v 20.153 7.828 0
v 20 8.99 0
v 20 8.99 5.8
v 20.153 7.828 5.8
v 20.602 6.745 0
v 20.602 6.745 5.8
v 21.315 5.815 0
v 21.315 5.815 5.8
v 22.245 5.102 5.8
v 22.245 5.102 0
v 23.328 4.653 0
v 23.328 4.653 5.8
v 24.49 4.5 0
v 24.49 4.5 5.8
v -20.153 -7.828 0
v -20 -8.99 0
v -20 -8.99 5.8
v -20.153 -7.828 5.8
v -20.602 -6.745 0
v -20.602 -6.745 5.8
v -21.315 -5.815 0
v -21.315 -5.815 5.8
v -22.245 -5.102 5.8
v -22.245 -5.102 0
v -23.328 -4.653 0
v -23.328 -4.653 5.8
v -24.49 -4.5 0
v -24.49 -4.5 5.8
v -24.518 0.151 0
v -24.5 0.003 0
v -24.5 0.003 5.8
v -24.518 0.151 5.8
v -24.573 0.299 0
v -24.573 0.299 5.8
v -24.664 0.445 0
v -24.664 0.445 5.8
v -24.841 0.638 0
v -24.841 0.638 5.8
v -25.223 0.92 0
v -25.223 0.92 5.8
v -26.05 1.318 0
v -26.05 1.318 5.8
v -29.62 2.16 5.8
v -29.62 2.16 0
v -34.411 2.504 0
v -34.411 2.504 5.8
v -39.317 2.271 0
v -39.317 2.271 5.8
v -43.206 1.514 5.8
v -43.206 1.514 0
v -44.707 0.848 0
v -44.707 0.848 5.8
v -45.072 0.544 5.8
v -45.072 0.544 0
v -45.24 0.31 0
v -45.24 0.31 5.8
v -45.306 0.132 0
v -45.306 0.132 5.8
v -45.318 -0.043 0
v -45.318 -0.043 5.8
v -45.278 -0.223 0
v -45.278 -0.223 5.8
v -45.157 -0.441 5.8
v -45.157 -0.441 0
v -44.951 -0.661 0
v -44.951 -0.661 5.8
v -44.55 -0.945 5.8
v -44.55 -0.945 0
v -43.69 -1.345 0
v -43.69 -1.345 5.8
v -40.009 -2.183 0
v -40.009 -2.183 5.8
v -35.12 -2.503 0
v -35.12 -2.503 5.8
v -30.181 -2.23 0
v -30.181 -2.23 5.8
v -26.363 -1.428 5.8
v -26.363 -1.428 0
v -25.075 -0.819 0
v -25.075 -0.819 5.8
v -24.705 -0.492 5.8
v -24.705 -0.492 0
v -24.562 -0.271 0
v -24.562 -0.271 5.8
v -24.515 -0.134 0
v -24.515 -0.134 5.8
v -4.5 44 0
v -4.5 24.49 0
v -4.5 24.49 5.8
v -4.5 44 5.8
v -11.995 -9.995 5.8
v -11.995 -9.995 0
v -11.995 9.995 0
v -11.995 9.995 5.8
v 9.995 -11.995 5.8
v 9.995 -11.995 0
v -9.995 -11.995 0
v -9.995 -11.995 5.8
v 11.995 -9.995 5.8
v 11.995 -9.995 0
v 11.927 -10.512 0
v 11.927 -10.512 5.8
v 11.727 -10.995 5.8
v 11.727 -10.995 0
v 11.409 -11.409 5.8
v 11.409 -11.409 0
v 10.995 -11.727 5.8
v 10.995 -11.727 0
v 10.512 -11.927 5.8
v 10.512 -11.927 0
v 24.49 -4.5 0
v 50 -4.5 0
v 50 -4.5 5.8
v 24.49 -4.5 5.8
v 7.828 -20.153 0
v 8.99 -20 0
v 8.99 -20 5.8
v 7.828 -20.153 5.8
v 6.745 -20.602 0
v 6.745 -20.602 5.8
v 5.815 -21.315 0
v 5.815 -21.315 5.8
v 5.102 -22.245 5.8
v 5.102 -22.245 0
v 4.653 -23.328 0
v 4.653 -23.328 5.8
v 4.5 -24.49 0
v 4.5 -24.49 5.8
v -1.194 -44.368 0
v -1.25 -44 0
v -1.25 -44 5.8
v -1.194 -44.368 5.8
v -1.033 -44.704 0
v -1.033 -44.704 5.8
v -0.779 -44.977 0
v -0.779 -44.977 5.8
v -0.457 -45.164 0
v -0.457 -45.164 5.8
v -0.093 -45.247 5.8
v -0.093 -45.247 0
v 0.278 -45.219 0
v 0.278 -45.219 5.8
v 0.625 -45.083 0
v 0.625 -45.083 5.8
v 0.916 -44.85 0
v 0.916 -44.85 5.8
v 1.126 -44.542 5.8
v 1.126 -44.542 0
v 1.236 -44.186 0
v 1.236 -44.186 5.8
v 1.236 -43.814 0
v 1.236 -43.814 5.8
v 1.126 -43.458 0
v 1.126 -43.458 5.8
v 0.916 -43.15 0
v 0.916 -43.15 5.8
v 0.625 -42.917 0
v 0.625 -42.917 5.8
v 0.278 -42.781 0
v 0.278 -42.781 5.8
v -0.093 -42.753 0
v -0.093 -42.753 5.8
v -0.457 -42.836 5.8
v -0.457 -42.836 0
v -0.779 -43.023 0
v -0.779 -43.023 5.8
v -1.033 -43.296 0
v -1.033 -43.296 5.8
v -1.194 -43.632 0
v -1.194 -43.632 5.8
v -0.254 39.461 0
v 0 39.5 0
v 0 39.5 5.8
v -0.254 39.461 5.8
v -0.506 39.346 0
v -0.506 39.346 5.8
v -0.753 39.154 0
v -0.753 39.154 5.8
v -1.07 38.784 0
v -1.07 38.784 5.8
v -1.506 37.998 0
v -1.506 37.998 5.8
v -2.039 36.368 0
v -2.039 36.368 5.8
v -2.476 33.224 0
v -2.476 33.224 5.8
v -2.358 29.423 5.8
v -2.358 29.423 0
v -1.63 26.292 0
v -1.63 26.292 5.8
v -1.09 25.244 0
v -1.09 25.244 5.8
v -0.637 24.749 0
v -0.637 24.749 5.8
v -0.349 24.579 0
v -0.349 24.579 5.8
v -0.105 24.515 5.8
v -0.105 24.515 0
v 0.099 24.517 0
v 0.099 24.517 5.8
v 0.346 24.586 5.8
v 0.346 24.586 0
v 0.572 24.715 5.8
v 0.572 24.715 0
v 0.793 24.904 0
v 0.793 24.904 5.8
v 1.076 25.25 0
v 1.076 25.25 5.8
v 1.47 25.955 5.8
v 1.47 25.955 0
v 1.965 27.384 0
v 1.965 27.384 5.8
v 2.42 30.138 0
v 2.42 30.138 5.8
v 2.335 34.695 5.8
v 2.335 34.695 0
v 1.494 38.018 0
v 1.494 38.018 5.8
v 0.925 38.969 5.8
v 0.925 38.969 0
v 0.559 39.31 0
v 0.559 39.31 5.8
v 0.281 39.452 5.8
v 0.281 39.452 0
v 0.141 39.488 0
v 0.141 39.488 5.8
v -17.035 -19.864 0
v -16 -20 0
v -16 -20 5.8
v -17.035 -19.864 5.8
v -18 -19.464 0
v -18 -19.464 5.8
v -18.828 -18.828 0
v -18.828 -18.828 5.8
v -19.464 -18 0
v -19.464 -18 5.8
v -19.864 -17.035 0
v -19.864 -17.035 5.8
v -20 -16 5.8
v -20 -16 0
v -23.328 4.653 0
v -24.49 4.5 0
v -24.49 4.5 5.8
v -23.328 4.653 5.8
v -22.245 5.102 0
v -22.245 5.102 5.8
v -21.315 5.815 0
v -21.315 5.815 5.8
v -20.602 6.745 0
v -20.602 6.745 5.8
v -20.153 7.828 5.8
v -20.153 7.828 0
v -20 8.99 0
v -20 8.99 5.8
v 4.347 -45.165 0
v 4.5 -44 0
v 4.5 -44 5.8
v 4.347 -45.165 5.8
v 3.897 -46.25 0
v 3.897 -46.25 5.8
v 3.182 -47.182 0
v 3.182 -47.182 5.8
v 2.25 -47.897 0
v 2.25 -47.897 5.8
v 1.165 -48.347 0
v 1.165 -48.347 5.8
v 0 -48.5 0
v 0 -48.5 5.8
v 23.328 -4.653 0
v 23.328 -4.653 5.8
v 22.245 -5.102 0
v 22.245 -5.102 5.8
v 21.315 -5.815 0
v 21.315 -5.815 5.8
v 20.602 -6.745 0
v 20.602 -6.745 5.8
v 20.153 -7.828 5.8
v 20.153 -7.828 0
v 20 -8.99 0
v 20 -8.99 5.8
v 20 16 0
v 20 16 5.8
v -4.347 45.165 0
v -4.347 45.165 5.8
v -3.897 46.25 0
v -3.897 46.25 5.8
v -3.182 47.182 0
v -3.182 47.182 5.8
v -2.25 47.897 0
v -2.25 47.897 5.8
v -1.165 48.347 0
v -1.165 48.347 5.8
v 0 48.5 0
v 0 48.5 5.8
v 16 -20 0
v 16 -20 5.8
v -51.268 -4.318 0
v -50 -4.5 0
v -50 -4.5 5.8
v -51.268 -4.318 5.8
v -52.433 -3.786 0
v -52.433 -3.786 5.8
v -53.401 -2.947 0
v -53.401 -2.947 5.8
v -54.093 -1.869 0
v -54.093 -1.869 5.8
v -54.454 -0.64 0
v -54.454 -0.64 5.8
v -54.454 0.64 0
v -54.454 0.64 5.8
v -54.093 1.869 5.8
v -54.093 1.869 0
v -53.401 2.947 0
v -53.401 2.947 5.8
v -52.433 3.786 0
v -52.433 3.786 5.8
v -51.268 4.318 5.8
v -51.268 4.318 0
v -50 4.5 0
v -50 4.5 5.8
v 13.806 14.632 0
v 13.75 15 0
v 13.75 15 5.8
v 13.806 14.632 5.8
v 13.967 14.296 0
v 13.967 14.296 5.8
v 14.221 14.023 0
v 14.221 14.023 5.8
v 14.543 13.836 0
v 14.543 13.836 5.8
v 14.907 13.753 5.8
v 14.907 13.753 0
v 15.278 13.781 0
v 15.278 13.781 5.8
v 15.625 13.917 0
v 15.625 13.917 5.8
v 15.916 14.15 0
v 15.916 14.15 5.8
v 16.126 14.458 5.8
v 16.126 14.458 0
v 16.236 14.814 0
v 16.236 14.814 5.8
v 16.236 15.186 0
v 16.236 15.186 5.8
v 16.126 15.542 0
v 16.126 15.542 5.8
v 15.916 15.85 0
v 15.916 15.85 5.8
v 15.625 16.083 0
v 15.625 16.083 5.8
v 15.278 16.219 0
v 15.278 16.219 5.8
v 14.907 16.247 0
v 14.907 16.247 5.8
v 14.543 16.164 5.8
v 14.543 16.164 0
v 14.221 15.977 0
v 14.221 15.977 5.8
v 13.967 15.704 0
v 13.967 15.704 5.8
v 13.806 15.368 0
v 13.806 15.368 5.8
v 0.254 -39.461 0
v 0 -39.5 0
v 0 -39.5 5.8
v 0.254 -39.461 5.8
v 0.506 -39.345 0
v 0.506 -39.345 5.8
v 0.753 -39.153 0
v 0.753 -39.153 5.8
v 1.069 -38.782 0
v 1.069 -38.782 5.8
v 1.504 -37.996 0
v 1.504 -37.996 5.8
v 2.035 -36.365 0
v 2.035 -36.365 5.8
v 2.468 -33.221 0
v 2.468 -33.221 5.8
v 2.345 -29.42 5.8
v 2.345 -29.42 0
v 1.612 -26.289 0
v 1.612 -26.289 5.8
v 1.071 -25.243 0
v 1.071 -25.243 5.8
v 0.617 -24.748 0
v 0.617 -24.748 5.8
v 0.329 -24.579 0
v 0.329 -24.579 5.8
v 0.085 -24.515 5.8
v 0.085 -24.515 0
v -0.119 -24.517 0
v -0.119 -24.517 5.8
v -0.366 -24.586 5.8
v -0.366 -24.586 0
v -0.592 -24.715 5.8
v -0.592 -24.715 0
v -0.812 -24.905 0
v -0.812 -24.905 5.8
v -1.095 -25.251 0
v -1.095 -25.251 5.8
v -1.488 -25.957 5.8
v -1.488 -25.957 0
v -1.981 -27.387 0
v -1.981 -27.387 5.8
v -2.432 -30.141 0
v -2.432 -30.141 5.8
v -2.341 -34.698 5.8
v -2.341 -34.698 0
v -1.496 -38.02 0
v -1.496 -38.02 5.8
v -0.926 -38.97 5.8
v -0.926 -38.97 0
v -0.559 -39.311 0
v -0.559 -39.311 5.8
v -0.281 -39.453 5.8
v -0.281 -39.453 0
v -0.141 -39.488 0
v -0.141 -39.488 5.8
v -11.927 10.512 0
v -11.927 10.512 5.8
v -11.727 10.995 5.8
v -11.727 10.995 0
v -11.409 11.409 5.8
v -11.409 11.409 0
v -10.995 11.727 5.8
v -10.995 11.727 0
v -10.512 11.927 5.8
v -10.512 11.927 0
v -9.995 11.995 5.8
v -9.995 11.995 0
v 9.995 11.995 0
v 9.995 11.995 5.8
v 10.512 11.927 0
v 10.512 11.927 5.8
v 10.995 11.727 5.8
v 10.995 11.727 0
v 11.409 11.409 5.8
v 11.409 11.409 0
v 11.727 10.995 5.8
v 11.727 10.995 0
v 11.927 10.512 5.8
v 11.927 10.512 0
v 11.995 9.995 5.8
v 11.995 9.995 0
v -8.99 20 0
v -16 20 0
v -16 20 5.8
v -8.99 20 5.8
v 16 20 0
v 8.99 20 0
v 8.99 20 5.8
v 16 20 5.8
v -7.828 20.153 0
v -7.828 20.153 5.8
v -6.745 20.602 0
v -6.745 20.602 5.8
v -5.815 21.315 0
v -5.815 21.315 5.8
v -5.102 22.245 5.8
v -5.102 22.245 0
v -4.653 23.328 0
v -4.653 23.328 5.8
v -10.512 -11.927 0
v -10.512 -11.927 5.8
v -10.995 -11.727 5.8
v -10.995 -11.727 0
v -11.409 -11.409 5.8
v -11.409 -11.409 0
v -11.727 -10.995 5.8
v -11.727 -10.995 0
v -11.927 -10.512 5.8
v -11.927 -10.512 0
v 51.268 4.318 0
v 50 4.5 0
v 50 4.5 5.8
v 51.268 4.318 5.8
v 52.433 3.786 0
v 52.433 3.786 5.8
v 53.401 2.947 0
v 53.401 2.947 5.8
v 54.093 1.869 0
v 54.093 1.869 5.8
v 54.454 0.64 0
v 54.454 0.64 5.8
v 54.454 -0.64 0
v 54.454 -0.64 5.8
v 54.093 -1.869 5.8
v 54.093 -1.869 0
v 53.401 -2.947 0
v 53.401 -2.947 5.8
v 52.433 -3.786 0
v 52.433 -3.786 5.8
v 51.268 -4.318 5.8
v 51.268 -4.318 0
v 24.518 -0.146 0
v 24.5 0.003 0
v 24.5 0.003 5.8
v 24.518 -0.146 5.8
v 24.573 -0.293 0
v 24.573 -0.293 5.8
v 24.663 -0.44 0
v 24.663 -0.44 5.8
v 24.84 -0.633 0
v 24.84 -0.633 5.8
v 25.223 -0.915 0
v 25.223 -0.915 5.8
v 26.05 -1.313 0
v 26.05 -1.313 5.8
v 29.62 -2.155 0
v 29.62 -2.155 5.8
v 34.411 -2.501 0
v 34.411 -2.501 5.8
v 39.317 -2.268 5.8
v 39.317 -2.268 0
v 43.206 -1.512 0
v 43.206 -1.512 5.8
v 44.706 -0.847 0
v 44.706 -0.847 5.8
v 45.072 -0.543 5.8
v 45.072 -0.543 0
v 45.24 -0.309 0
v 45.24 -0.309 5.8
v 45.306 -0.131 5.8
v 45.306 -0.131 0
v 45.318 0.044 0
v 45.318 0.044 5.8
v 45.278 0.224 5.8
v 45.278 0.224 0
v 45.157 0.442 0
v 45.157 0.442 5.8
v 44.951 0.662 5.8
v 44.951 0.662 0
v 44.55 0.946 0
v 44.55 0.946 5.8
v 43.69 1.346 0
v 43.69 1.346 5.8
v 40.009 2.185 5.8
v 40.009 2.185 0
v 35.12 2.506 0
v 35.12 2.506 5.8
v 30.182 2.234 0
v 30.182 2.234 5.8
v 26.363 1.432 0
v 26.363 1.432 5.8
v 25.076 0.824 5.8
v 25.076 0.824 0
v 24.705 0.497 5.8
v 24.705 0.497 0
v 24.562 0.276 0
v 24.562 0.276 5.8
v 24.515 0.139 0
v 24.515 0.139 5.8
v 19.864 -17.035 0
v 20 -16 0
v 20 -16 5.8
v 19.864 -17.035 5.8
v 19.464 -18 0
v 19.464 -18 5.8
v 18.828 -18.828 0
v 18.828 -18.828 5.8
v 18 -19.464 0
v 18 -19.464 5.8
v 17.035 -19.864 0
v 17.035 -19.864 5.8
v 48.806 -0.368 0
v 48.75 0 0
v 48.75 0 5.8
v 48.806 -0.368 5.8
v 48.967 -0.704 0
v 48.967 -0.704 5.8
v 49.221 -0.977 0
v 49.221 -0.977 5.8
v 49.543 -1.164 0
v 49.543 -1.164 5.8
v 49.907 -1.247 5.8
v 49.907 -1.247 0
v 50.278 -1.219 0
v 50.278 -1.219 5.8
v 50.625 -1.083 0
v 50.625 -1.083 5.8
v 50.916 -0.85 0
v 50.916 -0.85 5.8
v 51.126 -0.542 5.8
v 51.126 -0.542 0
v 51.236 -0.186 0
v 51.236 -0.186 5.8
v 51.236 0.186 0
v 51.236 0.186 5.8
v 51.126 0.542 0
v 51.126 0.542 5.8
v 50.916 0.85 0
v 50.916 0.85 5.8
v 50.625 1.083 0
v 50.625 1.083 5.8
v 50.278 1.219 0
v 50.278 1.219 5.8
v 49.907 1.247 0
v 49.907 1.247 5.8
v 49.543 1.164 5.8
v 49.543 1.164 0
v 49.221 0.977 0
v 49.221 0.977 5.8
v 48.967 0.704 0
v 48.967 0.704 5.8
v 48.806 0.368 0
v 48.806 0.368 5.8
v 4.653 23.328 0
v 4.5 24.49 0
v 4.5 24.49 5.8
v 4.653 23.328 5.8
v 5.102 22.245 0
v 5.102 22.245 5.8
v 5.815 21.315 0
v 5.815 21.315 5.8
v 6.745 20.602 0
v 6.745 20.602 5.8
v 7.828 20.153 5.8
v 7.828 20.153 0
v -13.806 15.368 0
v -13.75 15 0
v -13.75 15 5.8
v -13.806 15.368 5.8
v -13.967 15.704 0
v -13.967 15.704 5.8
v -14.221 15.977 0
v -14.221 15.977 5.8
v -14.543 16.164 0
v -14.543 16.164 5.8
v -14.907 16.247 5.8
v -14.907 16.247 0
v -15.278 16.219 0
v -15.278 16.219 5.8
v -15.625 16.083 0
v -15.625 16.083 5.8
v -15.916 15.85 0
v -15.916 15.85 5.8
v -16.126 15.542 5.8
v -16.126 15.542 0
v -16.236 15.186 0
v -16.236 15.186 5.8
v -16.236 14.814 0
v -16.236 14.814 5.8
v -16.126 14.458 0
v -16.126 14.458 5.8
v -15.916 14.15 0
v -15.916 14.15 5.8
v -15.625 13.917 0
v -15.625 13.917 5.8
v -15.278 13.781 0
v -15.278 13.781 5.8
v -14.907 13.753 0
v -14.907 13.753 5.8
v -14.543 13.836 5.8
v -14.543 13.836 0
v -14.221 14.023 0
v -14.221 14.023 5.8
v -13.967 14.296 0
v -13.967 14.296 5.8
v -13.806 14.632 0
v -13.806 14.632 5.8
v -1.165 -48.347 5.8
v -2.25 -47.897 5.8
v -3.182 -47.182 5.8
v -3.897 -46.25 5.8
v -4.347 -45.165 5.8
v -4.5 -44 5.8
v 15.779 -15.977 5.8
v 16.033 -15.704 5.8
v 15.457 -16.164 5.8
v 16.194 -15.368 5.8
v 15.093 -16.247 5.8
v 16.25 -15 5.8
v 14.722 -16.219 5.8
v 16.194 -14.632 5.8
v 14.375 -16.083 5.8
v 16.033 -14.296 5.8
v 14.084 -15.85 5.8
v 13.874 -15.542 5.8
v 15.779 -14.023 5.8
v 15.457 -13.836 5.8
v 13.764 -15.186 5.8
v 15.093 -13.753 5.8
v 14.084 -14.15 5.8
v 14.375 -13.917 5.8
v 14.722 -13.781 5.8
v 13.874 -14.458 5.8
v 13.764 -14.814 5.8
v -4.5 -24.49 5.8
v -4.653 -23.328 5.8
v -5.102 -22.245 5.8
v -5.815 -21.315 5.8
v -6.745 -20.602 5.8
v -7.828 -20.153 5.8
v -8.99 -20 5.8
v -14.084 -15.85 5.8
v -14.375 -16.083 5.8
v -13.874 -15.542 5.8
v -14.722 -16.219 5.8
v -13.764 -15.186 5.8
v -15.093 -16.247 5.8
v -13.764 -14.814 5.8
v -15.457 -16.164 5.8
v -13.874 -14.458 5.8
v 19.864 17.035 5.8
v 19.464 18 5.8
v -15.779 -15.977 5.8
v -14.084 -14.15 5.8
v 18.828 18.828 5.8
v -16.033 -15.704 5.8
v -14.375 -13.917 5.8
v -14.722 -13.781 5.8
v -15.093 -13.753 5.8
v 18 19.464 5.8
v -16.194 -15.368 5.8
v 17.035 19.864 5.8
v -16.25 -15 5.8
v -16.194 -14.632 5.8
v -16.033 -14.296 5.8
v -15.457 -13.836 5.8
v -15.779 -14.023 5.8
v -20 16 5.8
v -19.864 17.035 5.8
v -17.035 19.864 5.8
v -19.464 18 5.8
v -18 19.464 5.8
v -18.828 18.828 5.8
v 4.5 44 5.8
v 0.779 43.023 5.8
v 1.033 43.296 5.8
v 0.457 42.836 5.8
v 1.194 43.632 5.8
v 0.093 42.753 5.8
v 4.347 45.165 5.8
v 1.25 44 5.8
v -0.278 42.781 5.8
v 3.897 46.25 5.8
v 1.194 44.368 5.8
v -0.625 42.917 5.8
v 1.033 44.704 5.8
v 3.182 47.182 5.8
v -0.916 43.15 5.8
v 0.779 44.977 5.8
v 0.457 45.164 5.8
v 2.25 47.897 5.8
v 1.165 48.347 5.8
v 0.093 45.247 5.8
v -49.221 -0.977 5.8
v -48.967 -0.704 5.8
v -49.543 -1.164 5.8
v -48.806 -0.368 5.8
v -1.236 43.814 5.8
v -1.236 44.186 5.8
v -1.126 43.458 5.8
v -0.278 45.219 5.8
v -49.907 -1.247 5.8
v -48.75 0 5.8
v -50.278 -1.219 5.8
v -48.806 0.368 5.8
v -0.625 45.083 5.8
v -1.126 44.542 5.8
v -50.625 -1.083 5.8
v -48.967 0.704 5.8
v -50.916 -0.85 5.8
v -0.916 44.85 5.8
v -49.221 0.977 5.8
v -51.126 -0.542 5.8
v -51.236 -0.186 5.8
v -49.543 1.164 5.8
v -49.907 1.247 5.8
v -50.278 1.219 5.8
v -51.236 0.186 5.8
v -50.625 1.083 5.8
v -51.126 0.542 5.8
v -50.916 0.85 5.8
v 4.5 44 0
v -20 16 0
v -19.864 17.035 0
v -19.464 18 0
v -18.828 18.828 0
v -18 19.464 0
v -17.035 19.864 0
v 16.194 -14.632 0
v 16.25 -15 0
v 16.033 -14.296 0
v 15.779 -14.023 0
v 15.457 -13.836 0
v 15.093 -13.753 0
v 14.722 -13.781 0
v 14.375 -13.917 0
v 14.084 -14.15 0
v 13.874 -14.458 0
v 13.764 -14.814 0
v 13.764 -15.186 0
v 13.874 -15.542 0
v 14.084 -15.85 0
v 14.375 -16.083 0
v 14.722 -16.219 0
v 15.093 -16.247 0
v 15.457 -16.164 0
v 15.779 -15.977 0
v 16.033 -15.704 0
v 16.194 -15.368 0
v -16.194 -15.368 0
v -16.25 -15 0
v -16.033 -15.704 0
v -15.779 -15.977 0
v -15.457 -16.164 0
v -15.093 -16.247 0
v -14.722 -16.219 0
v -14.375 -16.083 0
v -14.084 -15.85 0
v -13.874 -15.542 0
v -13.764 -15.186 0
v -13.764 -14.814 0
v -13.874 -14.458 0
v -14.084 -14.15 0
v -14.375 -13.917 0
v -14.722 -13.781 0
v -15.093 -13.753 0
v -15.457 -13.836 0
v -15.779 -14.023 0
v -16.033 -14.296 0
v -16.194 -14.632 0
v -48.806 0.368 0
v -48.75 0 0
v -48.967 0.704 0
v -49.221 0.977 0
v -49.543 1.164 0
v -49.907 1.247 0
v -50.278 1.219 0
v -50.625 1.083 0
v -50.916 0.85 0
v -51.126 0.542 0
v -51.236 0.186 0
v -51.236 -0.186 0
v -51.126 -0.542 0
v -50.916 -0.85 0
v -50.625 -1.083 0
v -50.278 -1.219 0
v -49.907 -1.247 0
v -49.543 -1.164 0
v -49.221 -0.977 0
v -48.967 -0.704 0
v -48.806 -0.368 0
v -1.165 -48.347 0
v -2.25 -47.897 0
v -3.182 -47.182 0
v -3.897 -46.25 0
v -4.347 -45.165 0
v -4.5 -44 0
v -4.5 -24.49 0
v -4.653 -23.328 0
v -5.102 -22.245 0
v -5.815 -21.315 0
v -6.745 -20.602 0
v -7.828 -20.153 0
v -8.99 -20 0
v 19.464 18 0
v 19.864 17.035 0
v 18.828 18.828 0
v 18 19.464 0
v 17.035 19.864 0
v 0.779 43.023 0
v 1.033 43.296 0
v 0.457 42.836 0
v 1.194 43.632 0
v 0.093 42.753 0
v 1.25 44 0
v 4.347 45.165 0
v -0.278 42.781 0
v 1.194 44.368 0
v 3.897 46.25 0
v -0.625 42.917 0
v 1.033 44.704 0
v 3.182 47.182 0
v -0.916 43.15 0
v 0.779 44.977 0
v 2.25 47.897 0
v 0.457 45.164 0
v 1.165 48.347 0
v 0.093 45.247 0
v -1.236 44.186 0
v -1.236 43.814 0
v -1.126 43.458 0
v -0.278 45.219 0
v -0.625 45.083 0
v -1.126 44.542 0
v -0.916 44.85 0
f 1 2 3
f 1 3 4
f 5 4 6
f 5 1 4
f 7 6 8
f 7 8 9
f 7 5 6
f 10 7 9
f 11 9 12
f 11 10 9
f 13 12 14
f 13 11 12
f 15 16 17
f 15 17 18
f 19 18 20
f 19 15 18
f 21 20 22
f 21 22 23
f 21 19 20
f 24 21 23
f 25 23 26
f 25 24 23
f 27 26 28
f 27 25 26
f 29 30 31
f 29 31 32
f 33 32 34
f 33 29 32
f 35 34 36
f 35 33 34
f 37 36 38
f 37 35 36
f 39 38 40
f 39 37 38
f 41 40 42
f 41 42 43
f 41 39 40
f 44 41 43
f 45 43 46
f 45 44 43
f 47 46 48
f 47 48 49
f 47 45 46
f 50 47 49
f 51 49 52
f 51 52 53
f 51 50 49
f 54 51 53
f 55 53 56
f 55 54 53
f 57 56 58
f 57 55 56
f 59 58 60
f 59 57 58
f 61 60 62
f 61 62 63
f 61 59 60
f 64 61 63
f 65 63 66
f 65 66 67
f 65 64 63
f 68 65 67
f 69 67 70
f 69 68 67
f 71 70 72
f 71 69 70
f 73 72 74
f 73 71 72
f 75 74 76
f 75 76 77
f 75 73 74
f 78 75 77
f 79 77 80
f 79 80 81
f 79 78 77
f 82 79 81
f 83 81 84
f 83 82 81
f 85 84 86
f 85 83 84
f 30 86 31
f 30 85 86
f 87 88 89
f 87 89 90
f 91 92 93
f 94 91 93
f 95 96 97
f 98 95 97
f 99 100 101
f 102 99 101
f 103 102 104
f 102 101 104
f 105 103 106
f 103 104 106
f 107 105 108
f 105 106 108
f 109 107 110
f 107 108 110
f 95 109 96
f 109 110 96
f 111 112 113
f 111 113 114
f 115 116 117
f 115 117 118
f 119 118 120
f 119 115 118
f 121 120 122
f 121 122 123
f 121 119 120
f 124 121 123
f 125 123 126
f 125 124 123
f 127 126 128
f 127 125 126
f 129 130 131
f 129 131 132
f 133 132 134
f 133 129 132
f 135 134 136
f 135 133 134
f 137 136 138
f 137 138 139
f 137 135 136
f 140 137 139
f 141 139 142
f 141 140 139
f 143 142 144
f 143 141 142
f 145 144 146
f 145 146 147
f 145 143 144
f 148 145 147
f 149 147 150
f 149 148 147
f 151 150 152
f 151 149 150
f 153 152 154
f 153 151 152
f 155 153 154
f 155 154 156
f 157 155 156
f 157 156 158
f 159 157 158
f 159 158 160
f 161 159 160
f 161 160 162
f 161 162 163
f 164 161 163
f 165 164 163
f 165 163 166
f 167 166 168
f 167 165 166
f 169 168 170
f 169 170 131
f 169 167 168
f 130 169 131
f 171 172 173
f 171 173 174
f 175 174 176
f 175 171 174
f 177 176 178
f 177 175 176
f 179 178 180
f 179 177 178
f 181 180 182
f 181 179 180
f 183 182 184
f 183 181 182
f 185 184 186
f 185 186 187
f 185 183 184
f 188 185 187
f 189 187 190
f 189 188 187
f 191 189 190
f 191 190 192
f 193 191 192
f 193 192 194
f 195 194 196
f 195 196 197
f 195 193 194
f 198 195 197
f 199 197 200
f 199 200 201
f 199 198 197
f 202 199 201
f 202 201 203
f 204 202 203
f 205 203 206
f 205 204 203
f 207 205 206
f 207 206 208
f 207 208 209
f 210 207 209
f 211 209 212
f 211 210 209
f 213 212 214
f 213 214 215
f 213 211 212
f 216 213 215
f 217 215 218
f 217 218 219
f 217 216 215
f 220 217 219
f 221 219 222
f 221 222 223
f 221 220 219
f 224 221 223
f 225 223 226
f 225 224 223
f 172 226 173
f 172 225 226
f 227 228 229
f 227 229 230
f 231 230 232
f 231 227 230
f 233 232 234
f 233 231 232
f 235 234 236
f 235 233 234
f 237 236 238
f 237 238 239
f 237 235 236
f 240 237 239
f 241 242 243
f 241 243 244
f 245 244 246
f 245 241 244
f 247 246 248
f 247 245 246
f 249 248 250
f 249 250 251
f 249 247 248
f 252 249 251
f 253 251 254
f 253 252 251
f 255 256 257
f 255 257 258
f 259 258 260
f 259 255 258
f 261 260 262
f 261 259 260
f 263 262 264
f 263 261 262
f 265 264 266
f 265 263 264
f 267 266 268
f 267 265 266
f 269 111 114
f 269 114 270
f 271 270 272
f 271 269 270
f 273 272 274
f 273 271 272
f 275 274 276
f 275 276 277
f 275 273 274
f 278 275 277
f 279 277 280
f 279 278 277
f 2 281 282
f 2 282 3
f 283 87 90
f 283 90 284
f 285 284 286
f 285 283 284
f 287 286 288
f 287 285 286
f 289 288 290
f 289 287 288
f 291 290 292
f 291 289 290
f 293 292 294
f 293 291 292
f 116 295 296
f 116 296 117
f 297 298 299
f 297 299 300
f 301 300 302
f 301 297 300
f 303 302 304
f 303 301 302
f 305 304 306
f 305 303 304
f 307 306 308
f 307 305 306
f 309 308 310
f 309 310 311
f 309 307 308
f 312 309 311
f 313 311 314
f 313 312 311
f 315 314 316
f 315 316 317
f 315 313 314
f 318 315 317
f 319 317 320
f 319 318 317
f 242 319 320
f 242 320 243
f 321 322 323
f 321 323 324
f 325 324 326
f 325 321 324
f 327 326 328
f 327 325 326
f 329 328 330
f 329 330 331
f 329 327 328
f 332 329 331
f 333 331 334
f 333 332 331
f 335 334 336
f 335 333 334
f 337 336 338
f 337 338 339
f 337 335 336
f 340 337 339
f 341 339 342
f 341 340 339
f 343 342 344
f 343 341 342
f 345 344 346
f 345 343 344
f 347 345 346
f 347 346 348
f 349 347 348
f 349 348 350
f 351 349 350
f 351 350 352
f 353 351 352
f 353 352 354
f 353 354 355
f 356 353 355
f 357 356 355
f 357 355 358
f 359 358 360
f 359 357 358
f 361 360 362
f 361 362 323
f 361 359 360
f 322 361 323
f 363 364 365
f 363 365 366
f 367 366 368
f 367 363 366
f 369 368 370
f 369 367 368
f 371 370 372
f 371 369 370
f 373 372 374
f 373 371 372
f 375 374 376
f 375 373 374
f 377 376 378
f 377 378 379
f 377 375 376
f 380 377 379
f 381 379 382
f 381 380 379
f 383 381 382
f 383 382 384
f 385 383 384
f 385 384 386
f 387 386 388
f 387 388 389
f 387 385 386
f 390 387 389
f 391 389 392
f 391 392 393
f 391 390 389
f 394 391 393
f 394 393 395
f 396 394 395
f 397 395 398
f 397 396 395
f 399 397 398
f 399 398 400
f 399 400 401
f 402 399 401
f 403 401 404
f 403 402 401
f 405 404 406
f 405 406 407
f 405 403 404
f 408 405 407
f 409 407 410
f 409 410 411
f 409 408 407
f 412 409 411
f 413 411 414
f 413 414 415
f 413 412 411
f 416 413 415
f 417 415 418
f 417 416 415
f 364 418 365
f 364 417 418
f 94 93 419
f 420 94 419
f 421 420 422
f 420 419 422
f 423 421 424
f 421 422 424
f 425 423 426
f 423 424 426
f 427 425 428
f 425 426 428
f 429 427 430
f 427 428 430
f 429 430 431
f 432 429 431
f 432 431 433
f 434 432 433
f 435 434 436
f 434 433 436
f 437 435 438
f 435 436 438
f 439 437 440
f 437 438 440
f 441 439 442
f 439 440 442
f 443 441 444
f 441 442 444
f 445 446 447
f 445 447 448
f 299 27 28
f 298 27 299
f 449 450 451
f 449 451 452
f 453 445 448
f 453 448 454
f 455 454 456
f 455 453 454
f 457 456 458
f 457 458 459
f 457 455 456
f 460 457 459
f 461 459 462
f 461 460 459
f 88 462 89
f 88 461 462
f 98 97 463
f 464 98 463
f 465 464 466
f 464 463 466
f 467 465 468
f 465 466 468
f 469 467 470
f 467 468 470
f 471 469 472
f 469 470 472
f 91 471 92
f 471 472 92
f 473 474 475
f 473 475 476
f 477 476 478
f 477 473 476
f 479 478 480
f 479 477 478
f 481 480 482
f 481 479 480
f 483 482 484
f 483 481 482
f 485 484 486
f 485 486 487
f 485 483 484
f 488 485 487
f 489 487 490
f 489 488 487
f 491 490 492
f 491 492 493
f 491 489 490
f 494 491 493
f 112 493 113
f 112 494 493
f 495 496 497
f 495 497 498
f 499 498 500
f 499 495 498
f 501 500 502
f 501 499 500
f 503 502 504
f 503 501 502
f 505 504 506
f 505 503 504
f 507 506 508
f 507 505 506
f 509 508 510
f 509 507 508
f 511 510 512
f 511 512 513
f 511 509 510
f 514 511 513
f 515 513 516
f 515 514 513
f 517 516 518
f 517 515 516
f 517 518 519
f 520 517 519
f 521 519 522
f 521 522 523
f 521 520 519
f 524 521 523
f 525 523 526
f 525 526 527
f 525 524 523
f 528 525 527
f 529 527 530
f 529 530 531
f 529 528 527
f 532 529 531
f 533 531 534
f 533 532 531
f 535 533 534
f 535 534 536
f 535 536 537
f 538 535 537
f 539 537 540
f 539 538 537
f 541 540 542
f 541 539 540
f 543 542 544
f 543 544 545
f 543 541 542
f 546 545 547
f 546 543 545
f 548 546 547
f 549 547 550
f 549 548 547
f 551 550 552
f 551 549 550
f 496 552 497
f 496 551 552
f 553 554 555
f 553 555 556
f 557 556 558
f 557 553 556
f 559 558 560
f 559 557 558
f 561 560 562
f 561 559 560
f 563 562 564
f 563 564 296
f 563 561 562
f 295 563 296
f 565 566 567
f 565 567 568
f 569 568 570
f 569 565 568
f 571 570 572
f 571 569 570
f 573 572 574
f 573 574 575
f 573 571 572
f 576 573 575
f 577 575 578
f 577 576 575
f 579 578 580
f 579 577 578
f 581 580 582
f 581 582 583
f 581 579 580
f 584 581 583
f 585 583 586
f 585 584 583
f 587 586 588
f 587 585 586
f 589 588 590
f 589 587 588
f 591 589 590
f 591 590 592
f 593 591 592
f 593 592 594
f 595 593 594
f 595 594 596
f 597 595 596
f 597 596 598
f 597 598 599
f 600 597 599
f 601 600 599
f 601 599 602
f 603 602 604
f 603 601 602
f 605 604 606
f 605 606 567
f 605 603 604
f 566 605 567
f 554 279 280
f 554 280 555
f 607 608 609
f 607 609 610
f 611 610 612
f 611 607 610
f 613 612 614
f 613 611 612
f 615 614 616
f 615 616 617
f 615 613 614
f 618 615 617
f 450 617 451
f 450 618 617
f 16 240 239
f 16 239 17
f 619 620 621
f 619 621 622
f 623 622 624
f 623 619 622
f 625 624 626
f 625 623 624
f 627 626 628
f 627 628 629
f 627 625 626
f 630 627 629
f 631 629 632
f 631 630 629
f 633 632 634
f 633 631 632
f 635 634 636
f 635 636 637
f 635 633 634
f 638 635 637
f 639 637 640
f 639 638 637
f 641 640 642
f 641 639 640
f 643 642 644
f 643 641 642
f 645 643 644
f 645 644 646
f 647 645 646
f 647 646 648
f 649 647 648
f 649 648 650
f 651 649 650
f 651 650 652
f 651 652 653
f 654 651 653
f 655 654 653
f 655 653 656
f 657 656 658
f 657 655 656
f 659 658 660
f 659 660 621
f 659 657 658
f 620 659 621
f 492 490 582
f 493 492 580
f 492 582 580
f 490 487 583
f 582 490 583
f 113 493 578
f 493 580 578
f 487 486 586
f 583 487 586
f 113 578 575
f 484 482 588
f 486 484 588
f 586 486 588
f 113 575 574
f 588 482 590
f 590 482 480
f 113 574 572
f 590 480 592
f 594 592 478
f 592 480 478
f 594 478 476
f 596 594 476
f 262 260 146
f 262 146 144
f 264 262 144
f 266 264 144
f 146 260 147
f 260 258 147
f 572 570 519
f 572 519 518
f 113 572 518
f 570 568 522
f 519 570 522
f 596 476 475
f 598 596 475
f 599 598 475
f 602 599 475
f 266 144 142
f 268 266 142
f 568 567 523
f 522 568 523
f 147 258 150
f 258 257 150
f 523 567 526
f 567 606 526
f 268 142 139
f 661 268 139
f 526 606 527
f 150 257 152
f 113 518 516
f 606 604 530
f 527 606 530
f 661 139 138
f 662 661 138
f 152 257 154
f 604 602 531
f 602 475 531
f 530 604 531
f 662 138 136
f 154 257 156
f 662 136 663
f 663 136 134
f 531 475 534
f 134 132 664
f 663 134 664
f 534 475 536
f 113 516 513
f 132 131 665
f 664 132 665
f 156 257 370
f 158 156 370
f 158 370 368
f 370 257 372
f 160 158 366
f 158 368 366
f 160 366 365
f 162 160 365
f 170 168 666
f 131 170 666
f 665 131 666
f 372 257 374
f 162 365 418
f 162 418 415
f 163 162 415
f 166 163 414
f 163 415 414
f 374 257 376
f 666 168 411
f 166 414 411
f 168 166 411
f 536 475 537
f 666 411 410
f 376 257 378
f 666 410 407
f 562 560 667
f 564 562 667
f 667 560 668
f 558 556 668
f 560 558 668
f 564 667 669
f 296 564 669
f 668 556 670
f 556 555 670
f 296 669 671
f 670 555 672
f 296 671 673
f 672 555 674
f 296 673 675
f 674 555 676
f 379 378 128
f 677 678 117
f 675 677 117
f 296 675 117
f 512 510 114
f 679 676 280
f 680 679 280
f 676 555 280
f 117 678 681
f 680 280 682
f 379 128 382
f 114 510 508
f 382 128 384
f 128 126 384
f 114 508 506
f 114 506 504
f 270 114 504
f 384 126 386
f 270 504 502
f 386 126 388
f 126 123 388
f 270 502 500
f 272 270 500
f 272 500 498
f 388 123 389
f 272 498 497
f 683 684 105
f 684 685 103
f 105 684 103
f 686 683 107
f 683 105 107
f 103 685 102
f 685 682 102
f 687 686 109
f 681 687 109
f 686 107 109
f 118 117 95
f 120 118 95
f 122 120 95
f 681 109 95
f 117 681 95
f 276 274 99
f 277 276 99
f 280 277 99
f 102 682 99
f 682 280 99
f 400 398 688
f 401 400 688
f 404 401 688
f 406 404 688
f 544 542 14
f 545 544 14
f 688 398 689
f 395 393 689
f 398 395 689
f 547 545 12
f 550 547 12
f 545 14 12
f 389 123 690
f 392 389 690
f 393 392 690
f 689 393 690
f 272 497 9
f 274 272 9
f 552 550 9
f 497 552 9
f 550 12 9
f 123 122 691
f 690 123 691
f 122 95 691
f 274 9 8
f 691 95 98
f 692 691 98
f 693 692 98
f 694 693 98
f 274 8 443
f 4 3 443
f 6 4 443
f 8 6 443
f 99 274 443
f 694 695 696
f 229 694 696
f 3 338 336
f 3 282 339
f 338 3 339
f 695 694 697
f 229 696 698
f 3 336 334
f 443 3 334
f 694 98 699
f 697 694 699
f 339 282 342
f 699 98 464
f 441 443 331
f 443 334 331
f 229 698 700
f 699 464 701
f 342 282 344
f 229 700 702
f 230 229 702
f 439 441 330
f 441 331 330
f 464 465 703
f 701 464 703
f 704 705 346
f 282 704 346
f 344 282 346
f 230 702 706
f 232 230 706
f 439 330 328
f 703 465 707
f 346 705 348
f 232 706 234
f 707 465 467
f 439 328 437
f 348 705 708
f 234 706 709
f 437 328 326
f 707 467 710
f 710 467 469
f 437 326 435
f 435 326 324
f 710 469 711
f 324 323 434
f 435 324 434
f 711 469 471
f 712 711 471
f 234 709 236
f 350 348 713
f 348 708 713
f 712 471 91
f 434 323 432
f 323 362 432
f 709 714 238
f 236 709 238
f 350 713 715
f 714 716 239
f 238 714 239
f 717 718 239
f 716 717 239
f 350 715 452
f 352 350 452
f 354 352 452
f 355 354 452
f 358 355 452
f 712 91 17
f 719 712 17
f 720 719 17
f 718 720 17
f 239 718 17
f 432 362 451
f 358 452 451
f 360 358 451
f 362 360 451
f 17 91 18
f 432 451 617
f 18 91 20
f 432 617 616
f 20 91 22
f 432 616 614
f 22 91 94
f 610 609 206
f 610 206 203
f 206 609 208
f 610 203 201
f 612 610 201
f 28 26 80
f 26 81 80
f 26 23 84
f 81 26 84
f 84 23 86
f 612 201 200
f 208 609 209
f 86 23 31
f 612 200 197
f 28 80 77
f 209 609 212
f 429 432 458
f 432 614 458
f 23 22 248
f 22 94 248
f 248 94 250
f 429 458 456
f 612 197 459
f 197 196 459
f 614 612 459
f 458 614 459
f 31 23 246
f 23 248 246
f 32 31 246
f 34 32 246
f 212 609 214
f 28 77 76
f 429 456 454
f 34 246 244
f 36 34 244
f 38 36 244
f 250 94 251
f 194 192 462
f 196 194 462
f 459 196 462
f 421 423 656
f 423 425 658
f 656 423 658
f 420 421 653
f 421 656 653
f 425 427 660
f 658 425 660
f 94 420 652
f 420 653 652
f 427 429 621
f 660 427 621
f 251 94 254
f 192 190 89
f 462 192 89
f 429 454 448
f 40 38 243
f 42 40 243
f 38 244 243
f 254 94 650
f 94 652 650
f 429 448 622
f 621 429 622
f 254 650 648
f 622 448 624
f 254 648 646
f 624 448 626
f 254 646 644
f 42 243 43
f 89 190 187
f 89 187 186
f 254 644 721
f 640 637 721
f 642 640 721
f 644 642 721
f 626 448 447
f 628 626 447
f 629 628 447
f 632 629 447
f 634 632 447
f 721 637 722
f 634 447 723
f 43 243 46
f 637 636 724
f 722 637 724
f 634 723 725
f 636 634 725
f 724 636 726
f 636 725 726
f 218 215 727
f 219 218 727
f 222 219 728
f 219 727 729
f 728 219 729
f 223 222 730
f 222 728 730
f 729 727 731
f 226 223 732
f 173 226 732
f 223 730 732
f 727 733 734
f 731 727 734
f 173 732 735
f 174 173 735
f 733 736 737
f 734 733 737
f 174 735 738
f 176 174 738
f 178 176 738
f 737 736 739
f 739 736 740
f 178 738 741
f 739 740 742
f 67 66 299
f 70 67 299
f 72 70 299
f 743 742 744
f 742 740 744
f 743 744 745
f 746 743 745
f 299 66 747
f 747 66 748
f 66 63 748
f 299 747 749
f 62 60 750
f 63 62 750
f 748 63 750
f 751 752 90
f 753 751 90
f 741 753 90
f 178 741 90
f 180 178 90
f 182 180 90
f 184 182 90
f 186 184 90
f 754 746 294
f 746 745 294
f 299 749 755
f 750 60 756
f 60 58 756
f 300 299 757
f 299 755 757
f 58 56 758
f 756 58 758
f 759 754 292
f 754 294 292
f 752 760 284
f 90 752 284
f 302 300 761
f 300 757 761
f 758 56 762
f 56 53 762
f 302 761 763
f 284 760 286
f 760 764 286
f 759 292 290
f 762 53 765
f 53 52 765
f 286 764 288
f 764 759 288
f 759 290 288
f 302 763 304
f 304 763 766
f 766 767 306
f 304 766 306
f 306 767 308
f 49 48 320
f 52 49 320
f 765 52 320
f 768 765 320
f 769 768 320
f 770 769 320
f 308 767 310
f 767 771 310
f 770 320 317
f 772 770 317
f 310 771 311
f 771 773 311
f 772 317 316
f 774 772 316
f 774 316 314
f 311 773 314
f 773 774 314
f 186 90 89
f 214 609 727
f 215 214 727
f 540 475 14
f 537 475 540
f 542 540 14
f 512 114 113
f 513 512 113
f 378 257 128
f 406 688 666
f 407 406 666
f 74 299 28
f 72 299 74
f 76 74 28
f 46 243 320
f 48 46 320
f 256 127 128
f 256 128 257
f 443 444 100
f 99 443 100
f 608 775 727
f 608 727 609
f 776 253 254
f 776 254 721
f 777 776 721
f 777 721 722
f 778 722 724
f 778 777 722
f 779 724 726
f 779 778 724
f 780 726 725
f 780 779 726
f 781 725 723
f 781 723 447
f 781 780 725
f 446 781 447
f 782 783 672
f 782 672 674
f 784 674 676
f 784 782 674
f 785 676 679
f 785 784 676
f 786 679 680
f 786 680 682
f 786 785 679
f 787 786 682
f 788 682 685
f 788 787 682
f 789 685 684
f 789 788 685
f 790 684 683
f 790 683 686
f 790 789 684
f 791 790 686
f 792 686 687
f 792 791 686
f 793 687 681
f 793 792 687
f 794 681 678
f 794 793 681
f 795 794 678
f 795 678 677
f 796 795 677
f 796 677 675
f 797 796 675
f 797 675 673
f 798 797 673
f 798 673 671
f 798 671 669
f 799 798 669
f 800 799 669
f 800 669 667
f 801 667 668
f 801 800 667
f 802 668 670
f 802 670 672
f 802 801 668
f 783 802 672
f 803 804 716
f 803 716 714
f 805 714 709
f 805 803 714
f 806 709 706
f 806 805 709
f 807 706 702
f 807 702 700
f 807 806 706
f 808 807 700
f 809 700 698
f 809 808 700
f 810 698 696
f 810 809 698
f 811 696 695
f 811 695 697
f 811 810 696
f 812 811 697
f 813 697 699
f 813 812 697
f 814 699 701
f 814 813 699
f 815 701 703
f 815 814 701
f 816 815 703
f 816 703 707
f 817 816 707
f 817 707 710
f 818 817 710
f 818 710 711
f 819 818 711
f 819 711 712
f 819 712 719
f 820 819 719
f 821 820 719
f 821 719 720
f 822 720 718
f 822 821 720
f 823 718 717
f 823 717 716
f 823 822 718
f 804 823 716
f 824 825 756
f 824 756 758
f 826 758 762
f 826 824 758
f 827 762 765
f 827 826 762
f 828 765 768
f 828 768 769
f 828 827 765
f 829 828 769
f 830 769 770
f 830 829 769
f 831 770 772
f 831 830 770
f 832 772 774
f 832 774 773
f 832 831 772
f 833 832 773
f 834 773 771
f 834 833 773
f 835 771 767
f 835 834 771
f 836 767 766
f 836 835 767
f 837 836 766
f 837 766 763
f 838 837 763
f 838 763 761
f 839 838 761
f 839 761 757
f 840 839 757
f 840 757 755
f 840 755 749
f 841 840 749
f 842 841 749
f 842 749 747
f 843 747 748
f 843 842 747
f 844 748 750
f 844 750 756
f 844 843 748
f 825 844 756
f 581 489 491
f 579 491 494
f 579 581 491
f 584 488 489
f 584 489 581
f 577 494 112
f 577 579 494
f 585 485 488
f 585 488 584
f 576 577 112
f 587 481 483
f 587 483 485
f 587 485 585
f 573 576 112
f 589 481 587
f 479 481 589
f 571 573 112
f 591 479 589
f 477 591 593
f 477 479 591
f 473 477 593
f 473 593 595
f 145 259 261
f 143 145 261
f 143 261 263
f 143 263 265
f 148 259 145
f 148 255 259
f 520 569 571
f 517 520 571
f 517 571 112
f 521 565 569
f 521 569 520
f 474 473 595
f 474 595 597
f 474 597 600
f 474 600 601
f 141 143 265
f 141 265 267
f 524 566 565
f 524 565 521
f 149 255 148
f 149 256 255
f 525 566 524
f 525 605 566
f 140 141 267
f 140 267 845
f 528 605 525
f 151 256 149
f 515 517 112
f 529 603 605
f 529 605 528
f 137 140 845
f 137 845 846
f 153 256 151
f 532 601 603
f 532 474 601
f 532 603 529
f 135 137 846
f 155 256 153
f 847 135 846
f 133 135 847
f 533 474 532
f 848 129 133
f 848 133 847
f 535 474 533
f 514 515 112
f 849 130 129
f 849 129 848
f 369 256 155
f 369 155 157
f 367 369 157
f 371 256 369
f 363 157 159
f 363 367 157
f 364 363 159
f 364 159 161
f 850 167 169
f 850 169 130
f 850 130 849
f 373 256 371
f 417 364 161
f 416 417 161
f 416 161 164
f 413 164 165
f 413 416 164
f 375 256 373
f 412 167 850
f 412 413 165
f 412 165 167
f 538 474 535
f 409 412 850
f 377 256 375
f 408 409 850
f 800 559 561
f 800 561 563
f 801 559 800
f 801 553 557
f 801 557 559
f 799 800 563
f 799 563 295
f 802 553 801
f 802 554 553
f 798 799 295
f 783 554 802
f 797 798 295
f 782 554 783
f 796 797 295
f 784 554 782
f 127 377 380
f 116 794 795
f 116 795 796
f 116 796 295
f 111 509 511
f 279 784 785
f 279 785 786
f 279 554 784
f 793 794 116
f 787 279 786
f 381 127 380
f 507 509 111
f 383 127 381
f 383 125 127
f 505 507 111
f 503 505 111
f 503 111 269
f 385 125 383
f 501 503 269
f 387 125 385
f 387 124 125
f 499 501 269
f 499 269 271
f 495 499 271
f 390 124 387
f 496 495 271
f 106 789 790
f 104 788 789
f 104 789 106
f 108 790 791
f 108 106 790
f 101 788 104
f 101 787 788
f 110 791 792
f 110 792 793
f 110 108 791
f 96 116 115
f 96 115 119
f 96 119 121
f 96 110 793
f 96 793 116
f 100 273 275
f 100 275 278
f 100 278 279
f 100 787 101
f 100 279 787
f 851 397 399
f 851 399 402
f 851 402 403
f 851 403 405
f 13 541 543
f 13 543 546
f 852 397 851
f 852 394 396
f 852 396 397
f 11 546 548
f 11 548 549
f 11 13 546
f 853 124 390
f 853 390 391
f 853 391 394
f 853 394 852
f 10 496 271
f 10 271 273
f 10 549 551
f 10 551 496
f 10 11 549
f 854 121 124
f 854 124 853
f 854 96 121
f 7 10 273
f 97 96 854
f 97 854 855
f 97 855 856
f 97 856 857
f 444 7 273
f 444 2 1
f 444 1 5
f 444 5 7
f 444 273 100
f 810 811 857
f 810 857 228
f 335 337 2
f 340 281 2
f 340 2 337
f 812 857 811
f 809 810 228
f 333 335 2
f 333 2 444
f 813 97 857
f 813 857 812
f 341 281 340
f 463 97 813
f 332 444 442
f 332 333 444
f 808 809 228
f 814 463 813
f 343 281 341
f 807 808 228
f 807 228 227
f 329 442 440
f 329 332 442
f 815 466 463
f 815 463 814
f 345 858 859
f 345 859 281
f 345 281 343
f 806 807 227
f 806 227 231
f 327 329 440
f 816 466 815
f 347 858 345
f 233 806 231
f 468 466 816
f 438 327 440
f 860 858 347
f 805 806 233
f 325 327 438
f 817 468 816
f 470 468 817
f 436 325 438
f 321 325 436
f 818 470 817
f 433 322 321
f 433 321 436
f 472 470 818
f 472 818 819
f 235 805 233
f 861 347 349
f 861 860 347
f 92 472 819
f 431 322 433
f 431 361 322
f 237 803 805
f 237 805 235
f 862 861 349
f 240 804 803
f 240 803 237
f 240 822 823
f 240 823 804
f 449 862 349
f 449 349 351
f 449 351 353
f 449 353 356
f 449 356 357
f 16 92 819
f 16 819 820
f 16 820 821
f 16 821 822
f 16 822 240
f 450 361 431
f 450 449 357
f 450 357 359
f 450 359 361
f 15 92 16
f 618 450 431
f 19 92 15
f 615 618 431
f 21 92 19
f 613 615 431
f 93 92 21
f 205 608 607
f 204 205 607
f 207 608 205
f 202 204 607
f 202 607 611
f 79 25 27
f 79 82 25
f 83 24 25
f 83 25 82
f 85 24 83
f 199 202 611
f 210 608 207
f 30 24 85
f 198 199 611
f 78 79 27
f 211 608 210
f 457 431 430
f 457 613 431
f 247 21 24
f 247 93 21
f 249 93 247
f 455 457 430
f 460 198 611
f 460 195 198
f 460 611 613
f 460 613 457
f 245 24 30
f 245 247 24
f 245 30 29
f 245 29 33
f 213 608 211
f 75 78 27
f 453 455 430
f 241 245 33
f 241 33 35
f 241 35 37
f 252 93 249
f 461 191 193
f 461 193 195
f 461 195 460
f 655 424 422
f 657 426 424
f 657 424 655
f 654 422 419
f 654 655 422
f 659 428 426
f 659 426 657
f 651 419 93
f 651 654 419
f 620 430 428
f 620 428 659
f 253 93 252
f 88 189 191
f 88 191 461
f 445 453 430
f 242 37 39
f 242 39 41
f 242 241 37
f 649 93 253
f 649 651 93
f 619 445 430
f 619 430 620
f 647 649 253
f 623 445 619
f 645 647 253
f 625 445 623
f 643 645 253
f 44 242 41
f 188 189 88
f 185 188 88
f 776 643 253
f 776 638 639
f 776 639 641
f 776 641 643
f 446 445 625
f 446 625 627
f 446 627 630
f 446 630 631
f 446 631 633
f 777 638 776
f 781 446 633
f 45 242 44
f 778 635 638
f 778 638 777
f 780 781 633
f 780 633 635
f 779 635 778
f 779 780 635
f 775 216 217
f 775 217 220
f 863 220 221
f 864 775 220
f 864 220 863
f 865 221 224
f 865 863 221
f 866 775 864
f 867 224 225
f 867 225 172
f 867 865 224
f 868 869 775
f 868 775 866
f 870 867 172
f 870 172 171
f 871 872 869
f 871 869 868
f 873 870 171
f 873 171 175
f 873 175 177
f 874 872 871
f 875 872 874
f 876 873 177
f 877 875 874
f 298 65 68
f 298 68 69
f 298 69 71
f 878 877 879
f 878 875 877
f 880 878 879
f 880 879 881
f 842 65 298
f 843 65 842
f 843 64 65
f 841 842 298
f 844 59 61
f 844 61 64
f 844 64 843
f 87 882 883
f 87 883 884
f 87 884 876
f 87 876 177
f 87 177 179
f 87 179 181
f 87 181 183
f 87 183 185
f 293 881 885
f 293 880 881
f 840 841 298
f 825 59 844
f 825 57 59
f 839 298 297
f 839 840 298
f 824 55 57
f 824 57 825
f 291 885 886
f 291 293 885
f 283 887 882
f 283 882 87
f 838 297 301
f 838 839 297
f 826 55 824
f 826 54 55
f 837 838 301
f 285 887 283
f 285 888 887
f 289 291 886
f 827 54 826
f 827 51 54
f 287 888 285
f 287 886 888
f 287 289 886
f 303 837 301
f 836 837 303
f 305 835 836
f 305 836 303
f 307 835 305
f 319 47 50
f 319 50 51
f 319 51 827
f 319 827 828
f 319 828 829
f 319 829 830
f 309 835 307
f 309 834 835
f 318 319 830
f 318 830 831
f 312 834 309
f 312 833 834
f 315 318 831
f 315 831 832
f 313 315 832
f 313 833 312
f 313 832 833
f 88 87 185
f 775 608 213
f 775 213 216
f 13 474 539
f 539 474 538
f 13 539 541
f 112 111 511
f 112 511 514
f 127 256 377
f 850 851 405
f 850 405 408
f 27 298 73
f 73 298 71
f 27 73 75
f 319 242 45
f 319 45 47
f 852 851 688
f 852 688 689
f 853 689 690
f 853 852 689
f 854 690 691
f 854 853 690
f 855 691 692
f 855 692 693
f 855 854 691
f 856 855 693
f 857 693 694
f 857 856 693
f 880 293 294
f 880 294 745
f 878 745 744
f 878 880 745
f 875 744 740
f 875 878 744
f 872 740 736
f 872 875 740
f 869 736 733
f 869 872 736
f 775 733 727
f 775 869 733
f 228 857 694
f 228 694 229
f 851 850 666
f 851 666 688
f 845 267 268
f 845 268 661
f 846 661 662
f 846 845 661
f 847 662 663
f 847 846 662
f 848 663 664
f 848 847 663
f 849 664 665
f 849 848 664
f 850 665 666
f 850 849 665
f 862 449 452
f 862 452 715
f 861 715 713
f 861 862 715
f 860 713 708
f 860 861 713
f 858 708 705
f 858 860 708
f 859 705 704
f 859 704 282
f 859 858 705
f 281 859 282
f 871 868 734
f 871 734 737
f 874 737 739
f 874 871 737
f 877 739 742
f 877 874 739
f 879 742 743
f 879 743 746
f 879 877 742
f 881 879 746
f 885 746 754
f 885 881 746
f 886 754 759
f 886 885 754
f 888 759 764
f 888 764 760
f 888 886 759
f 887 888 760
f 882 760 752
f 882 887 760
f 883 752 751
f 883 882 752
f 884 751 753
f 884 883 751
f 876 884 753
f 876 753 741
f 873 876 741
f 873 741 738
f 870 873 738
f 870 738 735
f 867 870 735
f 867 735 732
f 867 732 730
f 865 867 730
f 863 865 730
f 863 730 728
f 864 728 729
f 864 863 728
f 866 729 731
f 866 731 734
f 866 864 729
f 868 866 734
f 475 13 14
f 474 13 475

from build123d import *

# Parameters (mm, degrees)
SKETCH1_R           = 1.25
SKETCH1_RX          = 7.495001668
SKETCH1_RY          = 2.505000234
SKETCH1_RX_2        = 10.410152117
SKETCH1_RY_2        = 2.505
BOSS_EXTRUDE1_DEPTH = 5.8


with BuildPart() as part:
    # Sketch1 → Boss-Extrude1 (new body)
    with BuildSketch(Plane.XY):
        with BuildLine():
            Line((-16, 20), (-8.99, 20))
            ThreePointArc((-8.99, 20), (-5.815090552, 21.315090552), (-4.5, 24.49))
            Line((-4.5, 24.49), (-4.5, 44))
            ThreePointArc((-4.5, 44), (-3.181980515, 47.181980515), (0, 48.5))
            ThreePointArc((0, 48.5), (3.181980515, 47.181980515), (4.5, 44))
            Line((4.5, 44), (4.5, 24.49))
            ThreePointArc((4.5, 24.49), (5.815090552, 21.315090552), (8.99, 20))
            Line((8.99, 20), (16, 20))
            ThreePointArc((16, 20), (18.828427125, 18.828427125), (20, 16))
            Line((20, 16), (20, 8.99))
            ThreePointArc((20, 8.99), (21.315090552, 5.815090552), (24.49, 4.5))
            Line((24.49, 4.5), (50, 4.5))
            ThreePointArc((50, 4.5), (54.5, 0), (50, -4.5))
            Line((50, -4.5), (24.49, -4.5))
            ThreePointArc((24.49, -4.5), (21.315090552, -5.815090552), (20, -8.99))
            Line((20, -8.99), (20, -16))
            ThreePointArc((20, -16), (18.828427125, -18.828427125), (16, -20))
            Line((16, -20), (8.99, -20))
            ThreePointArc((8.99, -20), (5.815090552, -21.315090552), (4.5, -24.49))
            Line((4.5, -24.49), (4.5, -44))
            ThreePointArc((4.5, -44), (3.181980515, -47.181980515), (0, -48.5))
            ThreePointArc((0, -48.5), (-3.181980515, -47.181980515), (-4.5, -44))
            Line((-4.5, -44), (-4.5, -24.49))
            ThreePointArc((-4.5, -24.49), (-5.815090552, -21.315090552), (-8.99, -20))
            Line((-8.99, -20), (-16, -20))
            ThreePointArc((-16, -20), (-18.828427125, -18.828427125), (-20, -16))
            Line((-20, -16), (-20, -8.99))
            ThreePointArc((-20, -8.99), (-21.315090552, -5.815090552), (-24.49, -4.5))
            Line((-24.49, -4.5), (-50, -4.5))
            ThreePointArc((-50, -4.5), (-54.5, 0), (-50, 4.5))
            Line((-50, 4.5), (-24.49, 4.5))
            ThreePointArc((-24.49, 4.5), (-21.315090552, 5.815090552), (-20, 8.99))
            Line((-20, 8.99), (-20, 16))
            ThreePointArc((-20, 16), (-18.828427125, 18.828427125), (-16, 20))
        make_face()
        with Locations((0, 44)):
            Circle(SKETCH1_R, mode=Mode.SUBTRACT)
        with Locations((-15, 15)):
            Circle(SKETCH1_R, mode=Mode.SUBTRACT)
        with Locations(Location((15, 15, 0), (0, 0, 180))):
            Circle(SKETCH1_R, mode=Mode.SUBTRACT)
        with Locations((15, -15)):
            Circle(SKETCH1_R, mode=Mode.SUBTRACT)
        with Locations(Location((-15, -15, 0), (0, 0, 180))):
            Circle(SKETCH1_R, mode=Mode.SUBTRACT)
        with Locations((-50, 0)):
            Circle(SKETCH1_R, mode=Mode.SUBTRACT)
        with Locations(Location((50, 0, 0), (0, 0, 180))):
            Circle(SKETCH1_R, mode=Mode.SUBTRACT)
        with Locations(Location((0, -44, 0), (0, 0, 180))):
            Circle(SKETCH1_R, mode=Mode.SUBTRACT)
        with Locations(Location((-0.004999676, 32.005), (0, 0, 89.961779812))):
            Ellipse(SKETCH1_RX, SKETCH1_RY, mode=Mode.SUBTRACT)
        with Locations(Location((-0.004999676, -32.005), (0, 0, -89.961779812))):
            Ellipse(SKETCH1_RX, SKETCH1_RY, mode=Mode.SUBTRACT)
        with Locations(Location((-34.90982111, 0.001514413), (0, 0, 0.005750064))):
            Ellipse(SKETCH1_RX_2, SKETCH1_RY_2, mode=Mode.SUBTRACT)
        with Locations(Location((34.90982111, 0.001514413), (0, 0, 179.994249936))):
            Ellipse(SKETCH1_RX_2, SKETCH1_RY_2, mode=Mode.SUBTRACT)
        with BuildLine():
            Line((9.99479618, -11.99479618), (-9.99479618, -11.99479618))
            ThreePointArc((-9.99479618, -11.99479618), (-11.409009742, -11.409009742), (-11.99479618, -9.99479618))
            Line((-11.99479618, -9.99479618), (-11.99479618, 9.99479618))
            ThreePointArc((-11.99479618, 9.99479618), (-11.409009742, 11.409009742), (-9.99479618, 11.99479618))
            Line((-9.99479618, 11.99479618), (9.99479618, 11.99479618))
            ThreePointArc((9.99479618, 11.99479618), (11.409009742, 11.409009742), (11.99479618, 9.99479618))
            Line((11.99479618, 9.99479618), (11.99479618, -9.99479618))
            ThreePointArc((11.99479618, -9.99479618), (11.409009742, -11.409009742), (9.99479618, -11.99479618))
        make_face(mode=Mode.SUBTRACT)
    extrude(amount=BOSS_EXTRUDE1_DEPTH)


solid = part.part
